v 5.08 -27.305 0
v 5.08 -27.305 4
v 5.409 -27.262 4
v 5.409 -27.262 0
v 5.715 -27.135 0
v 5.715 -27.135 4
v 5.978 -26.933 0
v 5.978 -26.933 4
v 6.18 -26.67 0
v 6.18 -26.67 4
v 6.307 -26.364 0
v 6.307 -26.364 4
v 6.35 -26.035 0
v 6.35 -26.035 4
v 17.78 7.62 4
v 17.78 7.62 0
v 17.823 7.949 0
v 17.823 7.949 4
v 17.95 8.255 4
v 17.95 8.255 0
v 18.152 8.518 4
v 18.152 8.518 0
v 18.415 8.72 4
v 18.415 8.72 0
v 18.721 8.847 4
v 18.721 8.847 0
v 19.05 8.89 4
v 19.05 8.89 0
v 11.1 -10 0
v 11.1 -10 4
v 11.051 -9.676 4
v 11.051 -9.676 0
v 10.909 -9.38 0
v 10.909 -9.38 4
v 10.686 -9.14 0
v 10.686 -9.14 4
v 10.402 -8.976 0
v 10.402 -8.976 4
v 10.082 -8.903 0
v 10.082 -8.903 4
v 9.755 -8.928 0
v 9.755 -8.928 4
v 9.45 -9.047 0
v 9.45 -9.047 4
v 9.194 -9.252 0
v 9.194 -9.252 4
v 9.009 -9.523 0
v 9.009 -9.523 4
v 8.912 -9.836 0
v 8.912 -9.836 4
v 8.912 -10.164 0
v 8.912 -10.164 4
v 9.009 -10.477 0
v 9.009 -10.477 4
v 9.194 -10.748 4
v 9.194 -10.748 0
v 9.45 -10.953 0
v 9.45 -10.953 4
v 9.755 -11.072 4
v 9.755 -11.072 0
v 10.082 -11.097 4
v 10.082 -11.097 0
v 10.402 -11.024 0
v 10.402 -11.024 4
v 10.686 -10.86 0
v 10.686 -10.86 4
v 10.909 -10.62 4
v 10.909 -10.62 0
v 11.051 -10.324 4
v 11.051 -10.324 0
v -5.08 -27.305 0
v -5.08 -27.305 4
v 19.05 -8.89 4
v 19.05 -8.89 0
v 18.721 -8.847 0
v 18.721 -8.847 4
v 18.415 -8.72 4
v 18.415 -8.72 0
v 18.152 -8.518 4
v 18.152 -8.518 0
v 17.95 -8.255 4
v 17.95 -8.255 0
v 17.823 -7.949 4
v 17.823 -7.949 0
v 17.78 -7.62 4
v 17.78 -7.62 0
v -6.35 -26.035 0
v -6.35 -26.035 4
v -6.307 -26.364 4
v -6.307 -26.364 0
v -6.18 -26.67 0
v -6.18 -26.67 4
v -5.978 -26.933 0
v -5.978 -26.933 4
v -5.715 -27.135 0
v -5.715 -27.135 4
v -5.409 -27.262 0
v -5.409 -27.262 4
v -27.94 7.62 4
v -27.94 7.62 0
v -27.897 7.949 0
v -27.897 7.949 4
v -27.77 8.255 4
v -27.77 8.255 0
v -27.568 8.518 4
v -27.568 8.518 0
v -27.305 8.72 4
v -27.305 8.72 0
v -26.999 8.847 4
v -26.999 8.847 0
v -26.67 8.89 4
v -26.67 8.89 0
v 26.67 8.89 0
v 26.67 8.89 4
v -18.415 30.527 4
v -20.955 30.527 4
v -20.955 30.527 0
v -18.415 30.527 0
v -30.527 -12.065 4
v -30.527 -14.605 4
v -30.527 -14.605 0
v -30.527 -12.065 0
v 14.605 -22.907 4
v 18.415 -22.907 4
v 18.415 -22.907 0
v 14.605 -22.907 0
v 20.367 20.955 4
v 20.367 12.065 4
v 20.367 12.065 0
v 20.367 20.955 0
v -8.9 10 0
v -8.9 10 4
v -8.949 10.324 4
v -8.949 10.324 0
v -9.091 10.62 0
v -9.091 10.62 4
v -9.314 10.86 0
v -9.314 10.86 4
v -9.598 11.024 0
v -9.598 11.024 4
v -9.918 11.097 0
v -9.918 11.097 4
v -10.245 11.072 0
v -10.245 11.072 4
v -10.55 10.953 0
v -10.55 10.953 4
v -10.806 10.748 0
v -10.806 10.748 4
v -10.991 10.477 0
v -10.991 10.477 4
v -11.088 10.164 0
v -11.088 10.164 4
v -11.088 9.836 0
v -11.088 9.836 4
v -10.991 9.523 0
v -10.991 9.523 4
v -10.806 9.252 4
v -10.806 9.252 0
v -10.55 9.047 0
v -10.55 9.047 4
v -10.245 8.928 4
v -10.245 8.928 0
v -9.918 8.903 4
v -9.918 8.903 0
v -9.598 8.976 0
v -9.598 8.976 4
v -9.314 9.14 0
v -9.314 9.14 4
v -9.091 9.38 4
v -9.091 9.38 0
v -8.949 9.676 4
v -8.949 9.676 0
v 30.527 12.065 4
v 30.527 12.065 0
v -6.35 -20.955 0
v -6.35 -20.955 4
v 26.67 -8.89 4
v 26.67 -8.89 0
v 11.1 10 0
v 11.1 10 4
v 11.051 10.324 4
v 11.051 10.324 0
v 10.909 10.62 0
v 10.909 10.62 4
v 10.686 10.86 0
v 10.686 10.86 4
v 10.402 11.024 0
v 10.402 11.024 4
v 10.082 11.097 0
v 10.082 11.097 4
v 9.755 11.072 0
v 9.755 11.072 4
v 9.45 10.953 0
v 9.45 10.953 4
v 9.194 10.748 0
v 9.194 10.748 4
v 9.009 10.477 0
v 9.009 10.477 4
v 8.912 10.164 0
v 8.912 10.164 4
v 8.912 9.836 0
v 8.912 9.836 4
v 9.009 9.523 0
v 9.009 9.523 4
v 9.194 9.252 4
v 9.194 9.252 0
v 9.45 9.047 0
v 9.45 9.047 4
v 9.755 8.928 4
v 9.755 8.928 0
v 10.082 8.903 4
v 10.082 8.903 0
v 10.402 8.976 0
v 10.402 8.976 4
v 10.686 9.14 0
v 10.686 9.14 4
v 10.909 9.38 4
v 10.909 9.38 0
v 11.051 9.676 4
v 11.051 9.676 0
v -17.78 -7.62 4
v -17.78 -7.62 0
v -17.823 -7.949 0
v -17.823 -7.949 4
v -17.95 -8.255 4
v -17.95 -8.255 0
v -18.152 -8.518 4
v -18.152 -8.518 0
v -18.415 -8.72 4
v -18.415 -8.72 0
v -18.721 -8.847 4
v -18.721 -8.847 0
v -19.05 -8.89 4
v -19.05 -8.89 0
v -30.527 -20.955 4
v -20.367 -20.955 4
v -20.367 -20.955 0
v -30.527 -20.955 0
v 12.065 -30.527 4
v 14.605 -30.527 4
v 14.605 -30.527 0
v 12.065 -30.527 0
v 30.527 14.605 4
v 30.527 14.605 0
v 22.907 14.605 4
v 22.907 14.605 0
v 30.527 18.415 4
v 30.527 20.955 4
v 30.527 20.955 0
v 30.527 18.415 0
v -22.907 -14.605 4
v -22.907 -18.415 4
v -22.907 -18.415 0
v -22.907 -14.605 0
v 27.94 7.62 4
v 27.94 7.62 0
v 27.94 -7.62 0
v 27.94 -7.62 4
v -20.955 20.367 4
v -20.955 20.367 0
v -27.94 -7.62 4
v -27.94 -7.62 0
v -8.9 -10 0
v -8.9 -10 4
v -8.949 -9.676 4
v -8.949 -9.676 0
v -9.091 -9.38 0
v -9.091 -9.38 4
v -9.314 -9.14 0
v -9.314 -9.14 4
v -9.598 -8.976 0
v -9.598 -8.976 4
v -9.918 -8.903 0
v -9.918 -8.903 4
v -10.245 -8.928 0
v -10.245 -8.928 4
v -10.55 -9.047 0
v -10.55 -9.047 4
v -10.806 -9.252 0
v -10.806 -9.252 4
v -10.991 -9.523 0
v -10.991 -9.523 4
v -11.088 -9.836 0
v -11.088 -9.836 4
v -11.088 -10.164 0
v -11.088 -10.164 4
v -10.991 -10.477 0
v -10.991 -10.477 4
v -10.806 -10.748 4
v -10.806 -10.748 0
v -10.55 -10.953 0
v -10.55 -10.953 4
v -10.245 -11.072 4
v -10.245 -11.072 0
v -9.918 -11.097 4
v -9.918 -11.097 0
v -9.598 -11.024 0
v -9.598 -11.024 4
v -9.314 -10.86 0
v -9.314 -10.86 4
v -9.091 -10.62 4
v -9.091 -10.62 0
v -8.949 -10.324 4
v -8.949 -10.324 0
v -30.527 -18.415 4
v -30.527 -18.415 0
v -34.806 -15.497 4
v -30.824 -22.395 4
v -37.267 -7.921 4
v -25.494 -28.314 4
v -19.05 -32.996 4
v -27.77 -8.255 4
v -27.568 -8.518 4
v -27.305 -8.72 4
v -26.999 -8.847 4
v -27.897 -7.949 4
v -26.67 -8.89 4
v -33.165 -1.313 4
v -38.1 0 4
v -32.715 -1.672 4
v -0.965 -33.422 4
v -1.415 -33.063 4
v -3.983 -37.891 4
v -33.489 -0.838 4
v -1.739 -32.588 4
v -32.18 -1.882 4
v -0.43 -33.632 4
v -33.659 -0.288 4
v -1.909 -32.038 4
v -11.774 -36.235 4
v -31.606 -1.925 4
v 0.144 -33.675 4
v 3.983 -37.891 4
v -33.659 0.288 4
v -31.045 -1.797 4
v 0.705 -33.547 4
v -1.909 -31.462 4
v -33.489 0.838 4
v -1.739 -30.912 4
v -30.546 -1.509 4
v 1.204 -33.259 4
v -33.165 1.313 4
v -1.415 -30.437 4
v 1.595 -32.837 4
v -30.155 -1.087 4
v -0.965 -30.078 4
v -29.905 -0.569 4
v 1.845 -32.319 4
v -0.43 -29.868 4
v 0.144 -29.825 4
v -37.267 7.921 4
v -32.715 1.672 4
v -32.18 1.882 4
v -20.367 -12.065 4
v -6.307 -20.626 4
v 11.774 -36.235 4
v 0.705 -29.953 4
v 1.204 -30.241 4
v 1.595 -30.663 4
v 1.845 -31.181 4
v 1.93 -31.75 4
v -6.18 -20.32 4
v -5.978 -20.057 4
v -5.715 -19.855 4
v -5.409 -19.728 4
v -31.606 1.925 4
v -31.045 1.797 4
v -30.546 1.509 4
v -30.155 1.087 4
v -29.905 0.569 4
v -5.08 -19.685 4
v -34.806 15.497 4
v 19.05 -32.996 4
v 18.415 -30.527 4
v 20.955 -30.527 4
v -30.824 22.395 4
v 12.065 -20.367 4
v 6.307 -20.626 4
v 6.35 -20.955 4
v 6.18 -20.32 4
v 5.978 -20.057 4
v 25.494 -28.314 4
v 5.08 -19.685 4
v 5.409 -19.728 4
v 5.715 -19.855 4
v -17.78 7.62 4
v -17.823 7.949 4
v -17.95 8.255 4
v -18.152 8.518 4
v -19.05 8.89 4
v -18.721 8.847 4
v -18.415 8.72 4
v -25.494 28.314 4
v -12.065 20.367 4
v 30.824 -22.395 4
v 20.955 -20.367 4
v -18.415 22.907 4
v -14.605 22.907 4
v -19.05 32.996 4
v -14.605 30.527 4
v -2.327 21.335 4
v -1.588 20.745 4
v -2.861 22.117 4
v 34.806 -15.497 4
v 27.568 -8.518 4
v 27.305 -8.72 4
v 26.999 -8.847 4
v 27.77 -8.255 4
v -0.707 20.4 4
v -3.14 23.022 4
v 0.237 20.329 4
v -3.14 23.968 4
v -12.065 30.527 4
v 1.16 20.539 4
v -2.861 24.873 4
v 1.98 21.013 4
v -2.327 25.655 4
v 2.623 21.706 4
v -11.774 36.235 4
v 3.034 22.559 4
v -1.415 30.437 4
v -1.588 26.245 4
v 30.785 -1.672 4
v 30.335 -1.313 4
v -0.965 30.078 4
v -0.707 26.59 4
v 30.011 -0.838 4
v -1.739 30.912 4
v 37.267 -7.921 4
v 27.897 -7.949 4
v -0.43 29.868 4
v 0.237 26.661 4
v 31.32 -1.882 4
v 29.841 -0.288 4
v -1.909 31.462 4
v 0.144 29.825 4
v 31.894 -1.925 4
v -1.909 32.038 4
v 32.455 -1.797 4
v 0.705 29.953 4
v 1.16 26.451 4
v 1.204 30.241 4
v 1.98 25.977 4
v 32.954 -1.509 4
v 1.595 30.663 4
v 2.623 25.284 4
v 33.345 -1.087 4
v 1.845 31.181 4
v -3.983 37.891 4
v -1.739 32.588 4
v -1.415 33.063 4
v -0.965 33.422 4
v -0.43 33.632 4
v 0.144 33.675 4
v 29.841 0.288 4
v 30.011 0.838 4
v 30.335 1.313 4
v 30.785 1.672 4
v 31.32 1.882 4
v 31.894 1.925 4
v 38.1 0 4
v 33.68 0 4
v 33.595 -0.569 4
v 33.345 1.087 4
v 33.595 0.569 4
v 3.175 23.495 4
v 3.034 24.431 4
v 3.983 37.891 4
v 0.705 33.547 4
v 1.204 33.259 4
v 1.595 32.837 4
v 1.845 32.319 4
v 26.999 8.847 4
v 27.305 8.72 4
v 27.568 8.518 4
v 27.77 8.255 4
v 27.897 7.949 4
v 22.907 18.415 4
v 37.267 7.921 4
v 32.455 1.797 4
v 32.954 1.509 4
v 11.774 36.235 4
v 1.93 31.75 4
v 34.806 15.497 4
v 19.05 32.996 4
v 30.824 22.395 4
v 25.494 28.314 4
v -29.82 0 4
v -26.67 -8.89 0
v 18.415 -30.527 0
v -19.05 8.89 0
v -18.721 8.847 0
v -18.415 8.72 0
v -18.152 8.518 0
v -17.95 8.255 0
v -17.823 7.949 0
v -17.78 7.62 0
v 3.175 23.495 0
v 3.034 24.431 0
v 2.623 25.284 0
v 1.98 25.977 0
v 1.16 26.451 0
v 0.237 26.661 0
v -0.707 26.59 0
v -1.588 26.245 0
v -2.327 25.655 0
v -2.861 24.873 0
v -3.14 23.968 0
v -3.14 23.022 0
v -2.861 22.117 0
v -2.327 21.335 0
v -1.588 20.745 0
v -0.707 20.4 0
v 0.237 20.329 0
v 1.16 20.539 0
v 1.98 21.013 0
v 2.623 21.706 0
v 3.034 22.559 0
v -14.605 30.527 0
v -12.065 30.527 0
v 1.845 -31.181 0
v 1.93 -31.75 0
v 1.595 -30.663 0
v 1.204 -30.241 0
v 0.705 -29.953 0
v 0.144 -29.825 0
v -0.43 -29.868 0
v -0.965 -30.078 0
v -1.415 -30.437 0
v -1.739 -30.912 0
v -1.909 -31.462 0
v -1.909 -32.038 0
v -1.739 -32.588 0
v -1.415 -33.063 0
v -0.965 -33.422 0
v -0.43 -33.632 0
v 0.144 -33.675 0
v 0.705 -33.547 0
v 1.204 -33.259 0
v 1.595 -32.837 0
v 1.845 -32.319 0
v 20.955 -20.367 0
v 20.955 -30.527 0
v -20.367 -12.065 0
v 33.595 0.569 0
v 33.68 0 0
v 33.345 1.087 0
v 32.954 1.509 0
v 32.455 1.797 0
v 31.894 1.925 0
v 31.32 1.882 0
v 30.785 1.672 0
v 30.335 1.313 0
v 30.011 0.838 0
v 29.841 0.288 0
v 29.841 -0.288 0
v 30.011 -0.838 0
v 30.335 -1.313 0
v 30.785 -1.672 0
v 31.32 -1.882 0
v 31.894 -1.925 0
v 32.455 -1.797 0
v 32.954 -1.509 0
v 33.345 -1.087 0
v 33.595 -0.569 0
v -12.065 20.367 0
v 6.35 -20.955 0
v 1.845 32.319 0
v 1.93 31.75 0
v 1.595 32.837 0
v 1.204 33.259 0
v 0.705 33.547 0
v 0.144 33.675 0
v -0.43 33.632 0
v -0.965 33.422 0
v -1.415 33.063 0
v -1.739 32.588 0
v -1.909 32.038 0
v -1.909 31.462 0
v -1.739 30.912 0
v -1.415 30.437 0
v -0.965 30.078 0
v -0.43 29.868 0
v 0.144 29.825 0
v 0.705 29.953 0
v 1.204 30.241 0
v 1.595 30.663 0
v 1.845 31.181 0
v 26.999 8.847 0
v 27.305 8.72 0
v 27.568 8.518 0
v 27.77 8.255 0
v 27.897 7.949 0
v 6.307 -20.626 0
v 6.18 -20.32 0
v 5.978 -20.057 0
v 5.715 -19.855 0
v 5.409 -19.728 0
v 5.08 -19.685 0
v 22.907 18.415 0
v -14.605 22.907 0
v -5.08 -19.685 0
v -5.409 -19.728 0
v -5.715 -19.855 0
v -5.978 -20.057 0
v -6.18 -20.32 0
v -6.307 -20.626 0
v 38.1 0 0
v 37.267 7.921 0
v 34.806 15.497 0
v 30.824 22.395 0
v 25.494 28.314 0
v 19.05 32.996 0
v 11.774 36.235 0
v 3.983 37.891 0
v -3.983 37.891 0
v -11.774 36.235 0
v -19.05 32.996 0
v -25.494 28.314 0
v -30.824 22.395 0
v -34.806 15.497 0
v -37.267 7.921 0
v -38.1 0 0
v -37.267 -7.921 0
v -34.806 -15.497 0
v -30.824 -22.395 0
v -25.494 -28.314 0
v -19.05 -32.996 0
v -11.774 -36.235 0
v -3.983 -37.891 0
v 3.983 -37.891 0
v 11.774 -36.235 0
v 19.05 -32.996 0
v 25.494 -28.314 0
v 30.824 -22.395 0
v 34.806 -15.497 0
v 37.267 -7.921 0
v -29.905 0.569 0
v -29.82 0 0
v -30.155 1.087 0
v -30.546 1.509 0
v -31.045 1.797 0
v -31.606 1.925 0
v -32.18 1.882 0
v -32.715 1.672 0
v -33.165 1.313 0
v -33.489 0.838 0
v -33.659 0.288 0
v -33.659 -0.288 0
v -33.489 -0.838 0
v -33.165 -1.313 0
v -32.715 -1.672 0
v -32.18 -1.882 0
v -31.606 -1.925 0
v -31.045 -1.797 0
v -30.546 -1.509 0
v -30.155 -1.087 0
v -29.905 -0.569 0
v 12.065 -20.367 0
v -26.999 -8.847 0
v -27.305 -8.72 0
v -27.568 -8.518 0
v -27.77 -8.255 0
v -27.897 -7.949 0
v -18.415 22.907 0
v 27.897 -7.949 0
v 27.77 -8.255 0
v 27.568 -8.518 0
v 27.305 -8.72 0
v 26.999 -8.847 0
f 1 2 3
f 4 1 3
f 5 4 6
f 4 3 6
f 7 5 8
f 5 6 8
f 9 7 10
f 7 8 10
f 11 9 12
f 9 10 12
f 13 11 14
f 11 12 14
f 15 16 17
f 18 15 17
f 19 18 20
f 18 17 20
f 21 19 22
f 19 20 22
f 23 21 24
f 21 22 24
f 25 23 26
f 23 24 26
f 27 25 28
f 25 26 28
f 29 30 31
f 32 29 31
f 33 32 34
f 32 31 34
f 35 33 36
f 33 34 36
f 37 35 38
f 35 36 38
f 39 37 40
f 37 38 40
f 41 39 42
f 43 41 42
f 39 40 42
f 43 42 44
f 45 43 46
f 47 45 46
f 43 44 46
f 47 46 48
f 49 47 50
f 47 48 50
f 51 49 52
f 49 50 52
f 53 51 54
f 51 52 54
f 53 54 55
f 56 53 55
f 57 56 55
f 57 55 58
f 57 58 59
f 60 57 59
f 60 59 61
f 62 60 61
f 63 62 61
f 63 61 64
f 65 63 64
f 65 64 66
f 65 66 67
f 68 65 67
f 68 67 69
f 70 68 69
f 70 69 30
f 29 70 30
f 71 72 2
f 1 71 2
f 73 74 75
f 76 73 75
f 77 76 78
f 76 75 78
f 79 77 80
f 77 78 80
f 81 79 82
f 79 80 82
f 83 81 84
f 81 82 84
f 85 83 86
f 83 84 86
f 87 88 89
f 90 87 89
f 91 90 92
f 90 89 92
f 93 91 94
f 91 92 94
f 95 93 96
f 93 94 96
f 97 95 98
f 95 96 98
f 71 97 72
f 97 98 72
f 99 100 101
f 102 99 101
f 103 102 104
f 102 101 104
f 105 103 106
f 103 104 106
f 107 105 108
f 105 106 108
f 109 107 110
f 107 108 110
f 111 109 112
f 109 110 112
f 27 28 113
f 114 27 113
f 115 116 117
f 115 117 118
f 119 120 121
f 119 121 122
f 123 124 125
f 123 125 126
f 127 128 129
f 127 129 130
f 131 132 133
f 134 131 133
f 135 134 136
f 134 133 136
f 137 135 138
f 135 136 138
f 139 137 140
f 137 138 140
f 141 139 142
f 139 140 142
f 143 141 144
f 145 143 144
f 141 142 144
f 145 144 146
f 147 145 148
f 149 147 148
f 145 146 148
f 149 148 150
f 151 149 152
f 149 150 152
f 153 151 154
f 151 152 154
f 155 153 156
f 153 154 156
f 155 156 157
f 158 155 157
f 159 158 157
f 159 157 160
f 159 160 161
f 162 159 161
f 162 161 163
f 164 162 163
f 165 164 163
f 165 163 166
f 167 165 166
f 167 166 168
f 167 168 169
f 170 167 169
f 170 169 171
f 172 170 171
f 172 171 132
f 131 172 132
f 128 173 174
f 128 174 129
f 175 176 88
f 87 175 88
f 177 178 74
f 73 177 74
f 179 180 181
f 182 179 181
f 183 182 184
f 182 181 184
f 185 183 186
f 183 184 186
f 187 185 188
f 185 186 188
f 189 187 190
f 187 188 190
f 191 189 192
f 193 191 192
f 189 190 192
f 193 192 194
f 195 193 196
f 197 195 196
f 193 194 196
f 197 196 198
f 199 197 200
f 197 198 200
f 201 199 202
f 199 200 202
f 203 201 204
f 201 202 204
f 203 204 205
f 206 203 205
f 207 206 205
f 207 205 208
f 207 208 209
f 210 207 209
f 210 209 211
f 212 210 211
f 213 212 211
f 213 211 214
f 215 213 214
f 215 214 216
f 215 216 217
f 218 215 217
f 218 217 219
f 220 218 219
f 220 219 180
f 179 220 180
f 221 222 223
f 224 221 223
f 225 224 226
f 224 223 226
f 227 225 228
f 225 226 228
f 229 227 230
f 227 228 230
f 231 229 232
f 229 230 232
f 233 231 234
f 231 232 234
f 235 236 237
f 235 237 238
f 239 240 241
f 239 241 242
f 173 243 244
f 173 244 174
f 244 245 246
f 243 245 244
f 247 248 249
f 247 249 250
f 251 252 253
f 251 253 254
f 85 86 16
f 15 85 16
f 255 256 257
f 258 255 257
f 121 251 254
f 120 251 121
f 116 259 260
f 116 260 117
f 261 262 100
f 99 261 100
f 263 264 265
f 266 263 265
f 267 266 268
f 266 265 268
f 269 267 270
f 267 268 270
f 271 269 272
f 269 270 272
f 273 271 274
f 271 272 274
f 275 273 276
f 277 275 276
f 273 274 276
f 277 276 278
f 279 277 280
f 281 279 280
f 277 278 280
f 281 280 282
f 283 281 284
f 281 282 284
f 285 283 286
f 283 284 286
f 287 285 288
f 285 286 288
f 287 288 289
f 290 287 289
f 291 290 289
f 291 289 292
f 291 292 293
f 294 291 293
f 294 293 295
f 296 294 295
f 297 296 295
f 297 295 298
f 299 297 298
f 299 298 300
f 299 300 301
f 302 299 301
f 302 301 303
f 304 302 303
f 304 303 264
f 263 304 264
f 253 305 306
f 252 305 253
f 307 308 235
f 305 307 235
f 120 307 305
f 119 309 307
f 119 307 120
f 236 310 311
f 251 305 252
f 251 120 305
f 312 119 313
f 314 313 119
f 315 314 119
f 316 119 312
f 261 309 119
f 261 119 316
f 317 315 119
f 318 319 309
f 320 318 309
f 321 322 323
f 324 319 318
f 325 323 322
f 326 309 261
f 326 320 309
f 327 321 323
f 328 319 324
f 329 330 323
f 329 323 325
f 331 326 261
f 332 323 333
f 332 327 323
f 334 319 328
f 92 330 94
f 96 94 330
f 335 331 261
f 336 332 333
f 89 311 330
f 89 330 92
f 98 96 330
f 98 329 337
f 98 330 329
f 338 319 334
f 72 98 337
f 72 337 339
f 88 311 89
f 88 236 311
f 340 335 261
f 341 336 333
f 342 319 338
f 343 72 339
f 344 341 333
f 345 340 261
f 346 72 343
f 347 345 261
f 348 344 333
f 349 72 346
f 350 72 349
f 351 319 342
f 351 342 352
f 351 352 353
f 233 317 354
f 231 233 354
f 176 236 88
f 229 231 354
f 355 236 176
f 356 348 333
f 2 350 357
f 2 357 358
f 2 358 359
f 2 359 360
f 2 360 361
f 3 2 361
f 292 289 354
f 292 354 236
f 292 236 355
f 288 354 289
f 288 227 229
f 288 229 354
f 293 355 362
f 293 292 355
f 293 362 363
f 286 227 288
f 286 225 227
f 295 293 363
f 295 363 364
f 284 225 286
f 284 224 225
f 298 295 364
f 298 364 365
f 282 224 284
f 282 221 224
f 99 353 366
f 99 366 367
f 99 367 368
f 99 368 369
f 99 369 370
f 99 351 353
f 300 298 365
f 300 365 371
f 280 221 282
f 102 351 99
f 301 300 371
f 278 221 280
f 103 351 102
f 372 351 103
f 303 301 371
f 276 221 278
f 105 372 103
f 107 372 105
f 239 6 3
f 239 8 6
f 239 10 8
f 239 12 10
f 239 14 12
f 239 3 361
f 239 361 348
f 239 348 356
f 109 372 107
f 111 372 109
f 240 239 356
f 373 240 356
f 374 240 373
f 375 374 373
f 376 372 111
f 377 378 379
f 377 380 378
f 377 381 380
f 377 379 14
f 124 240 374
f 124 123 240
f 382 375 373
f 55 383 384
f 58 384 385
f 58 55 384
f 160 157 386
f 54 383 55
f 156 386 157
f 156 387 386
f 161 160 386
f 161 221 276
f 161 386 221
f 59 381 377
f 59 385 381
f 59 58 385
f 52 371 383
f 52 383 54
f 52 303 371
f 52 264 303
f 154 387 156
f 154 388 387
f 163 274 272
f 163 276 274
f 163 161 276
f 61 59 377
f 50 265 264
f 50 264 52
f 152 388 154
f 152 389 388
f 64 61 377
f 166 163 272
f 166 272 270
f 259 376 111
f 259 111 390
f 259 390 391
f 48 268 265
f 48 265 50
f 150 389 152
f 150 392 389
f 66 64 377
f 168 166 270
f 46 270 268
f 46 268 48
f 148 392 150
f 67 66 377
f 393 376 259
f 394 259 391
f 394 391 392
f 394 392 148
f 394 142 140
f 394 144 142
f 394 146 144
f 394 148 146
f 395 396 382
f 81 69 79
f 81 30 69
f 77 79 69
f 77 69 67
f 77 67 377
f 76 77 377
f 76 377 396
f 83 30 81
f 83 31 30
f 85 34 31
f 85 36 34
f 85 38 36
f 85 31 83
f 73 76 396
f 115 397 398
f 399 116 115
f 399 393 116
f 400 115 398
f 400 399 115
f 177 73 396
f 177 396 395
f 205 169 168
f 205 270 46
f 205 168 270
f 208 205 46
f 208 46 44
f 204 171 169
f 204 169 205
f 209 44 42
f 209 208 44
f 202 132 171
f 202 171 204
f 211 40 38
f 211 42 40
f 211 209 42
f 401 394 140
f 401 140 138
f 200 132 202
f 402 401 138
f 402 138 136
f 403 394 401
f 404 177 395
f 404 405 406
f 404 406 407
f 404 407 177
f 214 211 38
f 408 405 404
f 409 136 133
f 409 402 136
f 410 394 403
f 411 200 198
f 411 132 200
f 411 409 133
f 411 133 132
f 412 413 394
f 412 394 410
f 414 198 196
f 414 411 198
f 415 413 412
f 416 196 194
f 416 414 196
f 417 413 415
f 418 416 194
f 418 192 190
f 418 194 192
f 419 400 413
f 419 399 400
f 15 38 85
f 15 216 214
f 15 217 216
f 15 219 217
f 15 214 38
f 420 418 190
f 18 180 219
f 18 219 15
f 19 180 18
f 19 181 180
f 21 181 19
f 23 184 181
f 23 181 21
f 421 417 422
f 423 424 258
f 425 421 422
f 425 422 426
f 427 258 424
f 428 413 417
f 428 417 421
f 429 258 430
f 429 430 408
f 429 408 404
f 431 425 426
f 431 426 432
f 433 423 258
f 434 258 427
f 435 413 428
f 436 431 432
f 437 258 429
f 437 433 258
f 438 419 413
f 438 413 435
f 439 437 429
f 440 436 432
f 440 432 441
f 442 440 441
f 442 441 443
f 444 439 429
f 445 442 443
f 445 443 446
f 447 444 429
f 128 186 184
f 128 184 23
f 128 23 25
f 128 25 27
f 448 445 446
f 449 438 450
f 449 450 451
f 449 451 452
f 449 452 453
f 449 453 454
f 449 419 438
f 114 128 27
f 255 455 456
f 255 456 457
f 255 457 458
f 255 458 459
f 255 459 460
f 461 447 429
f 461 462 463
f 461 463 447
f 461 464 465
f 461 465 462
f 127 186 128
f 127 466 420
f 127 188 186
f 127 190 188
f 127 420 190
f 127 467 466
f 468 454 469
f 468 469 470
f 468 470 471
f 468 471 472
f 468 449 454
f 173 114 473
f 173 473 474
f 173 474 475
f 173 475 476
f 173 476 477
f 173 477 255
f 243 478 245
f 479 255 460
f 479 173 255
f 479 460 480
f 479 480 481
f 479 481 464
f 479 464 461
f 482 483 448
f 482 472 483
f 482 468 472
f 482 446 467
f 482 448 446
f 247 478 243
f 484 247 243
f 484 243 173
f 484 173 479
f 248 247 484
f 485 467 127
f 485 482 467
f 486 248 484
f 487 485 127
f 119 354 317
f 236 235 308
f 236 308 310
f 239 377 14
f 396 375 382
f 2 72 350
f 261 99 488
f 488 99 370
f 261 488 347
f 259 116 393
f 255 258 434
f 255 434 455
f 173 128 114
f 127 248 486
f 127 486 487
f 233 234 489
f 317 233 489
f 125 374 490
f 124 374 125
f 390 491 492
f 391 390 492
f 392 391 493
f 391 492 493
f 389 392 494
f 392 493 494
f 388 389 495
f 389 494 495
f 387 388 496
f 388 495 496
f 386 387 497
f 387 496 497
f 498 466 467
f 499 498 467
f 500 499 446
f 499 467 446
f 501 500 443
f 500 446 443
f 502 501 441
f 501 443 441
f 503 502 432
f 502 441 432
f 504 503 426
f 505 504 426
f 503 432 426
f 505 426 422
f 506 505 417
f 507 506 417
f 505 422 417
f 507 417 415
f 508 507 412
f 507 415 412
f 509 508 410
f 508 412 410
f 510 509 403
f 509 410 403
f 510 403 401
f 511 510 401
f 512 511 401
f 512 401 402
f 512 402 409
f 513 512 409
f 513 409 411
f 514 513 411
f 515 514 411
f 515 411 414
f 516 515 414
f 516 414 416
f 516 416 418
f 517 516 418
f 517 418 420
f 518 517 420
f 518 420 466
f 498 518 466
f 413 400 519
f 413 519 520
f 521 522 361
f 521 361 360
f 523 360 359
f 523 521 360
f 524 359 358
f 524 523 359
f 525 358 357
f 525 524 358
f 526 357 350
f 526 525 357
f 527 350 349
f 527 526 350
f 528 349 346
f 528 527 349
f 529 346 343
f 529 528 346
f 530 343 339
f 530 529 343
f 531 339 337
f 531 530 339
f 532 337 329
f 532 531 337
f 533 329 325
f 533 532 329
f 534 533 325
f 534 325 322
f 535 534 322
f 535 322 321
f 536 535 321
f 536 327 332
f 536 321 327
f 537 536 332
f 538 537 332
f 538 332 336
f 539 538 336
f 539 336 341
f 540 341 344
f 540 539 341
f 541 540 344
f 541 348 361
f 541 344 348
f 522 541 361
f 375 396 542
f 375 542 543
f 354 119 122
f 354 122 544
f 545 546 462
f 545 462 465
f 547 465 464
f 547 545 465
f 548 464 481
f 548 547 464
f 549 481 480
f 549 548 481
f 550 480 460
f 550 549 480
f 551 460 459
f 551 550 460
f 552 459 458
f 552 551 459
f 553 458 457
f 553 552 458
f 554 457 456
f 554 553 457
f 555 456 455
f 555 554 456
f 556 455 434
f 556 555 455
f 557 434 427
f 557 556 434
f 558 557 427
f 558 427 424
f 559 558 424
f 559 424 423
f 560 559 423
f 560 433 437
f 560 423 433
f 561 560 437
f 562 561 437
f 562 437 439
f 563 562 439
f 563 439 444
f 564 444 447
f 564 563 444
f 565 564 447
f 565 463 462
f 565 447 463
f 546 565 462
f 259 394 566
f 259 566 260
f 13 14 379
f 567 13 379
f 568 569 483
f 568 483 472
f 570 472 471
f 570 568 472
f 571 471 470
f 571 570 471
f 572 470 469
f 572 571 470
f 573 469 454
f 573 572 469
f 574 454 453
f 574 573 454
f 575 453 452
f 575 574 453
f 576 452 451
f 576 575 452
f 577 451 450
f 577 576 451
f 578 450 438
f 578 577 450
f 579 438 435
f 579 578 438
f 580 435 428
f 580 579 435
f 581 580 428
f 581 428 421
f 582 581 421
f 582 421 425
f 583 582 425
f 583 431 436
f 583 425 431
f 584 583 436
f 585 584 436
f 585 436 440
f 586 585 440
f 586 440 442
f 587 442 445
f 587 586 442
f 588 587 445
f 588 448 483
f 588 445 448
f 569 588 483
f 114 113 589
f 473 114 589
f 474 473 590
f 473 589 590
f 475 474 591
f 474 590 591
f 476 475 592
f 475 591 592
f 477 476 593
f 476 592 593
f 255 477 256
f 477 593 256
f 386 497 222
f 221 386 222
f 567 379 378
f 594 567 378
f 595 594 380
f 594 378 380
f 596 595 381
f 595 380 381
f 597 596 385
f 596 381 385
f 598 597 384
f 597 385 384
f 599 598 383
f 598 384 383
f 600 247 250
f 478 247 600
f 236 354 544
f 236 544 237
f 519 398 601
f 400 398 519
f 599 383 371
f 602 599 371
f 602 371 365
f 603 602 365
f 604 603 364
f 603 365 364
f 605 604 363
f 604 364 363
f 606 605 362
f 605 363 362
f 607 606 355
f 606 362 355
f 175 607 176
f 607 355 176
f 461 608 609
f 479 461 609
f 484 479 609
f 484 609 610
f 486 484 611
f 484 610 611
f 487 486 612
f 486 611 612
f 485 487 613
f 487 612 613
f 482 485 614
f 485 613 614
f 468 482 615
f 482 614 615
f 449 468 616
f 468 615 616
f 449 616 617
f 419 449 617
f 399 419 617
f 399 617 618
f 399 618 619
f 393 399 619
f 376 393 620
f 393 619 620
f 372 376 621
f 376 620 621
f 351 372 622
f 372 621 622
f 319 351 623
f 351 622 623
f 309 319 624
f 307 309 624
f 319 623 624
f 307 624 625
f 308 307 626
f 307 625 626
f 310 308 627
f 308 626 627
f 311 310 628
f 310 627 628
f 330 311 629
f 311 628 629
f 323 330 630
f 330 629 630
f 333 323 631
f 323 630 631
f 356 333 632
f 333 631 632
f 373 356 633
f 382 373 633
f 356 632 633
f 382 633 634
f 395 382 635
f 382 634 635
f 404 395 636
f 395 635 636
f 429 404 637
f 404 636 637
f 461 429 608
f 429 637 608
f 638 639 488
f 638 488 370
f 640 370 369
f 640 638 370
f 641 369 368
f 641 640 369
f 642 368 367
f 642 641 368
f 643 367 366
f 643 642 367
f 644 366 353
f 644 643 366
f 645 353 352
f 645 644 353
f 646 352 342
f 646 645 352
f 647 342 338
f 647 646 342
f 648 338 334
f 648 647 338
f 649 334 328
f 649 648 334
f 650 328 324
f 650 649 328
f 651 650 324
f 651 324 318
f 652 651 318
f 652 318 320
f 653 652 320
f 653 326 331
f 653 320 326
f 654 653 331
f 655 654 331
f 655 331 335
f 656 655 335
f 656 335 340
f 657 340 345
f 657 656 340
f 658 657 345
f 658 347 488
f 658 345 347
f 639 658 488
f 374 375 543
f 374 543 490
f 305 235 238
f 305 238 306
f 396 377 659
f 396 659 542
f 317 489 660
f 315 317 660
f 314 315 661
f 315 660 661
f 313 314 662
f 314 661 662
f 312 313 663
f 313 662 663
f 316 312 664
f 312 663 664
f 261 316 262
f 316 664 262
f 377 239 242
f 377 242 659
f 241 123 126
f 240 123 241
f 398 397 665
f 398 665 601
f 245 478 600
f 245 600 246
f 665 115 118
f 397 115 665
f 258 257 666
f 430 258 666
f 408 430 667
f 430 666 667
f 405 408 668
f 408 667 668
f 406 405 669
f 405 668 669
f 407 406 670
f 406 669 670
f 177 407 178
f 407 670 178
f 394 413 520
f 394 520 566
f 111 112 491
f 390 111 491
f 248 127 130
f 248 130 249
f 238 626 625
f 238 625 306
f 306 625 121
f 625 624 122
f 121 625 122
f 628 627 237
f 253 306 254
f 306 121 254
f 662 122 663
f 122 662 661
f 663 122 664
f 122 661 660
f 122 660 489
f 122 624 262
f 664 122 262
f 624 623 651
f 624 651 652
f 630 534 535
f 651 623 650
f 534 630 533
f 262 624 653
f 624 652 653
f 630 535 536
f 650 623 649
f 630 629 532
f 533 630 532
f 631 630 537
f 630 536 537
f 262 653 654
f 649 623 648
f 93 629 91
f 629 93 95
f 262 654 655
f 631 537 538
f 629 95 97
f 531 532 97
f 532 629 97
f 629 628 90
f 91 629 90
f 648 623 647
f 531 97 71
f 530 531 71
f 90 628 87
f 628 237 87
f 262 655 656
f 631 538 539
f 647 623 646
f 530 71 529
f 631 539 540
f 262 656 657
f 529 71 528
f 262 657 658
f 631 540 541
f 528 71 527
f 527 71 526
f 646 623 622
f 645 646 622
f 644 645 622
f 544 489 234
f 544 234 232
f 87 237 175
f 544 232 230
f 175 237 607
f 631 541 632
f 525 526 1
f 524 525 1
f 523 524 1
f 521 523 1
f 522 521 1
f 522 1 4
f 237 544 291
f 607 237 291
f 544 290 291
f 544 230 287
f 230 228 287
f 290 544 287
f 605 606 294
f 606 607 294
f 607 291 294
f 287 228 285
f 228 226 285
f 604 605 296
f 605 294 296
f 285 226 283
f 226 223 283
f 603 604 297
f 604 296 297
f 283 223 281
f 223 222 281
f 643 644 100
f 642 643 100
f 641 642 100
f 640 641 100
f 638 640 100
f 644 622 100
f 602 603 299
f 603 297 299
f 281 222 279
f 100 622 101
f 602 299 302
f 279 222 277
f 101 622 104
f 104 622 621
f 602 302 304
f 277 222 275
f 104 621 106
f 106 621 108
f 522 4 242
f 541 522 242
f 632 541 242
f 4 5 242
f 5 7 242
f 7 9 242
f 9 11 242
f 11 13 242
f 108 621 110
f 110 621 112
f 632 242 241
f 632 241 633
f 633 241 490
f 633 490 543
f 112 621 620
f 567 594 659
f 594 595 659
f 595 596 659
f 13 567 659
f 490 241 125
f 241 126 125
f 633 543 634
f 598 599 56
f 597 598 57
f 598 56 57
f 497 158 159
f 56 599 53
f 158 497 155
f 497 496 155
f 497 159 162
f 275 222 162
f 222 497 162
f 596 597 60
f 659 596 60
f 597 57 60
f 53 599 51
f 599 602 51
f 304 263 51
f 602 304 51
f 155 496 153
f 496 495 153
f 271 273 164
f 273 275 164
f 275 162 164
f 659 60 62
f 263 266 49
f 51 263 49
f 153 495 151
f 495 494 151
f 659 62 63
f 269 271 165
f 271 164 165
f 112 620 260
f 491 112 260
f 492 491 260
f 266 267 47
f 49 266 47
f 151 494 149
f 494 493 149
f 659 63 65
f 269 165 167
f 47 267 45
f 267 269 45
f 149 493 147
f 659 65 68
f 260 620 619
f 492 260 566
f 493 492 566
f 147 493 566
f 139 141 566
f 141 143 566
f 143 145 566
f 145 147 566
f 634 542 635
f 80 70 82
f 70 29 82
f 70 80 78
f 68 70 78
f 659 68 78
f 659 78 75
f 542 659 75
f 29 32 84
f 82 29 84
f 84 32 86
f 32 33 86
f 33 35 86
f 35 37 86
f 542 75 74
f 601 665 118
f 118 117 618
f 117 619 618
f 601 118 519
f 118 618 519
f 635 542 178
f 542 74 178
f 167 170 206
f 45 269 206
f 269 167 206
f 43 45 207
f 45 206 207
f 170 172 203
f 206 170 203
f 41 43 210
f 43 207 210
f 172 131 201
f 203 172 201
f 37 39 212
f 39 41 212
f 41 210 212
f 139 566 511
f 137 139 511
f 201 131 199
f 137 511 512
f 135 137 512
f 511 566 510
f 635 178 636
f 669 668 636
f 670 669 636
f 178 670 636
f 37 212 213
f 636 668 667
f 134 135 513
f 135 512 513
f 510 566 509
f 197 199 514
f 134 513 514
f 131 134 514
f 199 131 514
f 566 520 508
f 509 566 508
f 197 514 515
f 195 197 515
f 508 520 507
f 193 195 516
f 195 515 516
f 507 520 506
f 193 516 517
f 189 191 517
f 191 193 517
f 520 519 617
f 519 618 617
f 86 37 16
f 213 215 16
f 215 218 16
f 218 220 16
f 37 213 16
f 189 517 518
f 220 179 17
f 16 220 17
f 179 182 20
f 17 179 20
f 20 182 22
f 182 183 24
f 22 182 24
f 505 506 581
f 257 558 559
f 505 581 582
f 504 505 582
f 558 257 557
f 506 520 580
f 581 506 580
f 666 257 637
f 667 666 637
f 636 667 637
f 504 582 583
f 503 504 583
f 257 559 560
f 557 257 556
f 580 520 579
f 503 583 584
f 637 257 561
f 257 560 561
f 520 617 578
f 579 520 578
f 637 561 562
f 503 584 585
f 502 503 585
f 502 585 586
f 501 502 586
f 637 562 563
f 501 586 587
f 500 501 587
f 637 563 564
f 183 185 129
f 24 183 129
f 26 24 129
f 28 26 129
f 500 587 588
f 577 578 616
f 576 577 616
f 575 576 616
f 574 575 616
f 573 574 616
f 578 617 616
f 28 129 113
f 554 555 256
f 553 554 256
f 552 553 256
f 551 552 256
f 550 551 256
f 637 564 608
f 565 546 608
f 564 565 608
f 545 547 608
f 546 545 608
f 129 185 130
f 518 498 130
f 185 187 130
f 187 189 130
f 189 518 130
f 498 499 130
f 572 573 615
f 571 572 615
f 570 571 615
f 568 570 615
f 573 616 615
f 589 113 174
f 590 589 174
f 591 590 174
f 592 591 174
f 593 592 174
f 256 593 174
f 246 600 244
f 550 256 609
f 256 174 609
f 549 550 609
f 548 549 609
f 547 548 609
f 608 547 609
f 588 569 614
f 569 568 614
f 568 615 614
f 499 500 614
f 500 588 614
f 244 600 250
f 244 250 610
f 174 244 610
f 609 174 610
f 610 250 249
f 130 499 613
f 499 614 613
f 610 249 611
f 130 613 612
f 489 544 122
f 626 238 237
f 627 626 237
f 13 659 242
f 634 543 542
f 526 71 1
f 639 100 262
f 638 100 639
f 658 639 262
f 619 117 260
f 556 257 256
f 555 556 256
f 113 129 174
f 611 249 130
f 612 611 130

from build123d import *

# Parameters (mm, degrees)
SKETCH1_R               = 38.1
BOSS_EXTRUDE1_DEPTH     = 4
SKETCH2_R               = 1.1
CUT_EXTRUDE1_DEPTH      = 55.029806589
CUT_EXTRUDE2_DEPTH      = 55.029806589
CUT_EXTRUDE2_DEPTH_BACK = 55.029806589
SKETCH3_R               = 1.9304
CUT_EXTRUDE3_DEPTH      = 55.029806589
CUT_EXTRUDE3_DEPTH_BACK = 55.029806589
CUT_EXTRUDE4_REACH      = 56.03
SKETCH5_R               = 3.175
CUT_EXTRUDE5_REACH      = 56.03


with BuildPart() as part:
    # Sketch1 → Boss-Extrude1 (new body)
    with BuildSketch(Plane.XY):
        Circle(SKETCH1_R)
    extrude(amount=BOSS_EXTRUDE1_DEPTH)

    # Sketch2 → Cut-Extrude1 (cut, through all)
    with BuildSketch(Plane.XY.offset(4)):
        with Locations((10, 10)):
            Circle(SKETCH2_R)
        with Locations((10, -10)):
            Circle(SKETCH2_R)
        with Locations((-10, -10)):
            Circle(SKETCH2_R)
        with Locations((-10, 10)):
            Circle(SKETCH2_R)
    extrude(amount=-CUT_EXTRUDE1_DEPTH, mode=Mode.SUBTRACT)

    # Sketch3 → Cut-Extrude2 (cut, two sides: drawn at the far end of the back side and taken through both)
    with BuildSketch(Plane.XY.offset(4).offset(-CUT_EXTRUDE2_DEPTH_BACK)):
        with Locations((0, -31.75)):
            Circle(SKETCH3_R)
        with Locations((-31.75, 0)):
            Circle(SKETCH3_R)
        with Locations((0, 31.75)):
            Circle(SKETCH3_R)
        with Locations((31.75, 0)):
            Circle(SKETCH3_R)
    extrude(amount=CUT_EXTRUDE2_DEPTH + CUT_EXTRUDE2_DEPTH_BACK, mode=Mode.SUBTRACT)

    # Sketch4 → Cut-Extrude3 (cut, two sides: drawn at the far end of the back side and taken through both)
    with BuildSketch(Plane.XY.offset(4).offset(-CUT_EXTRUDE3_DEPTH_BACK)):
        with BuildLine():
            Line((-19.05, -8.89), (-26.67, -8.89))
            ThreePointArc((-26.67, -8.89), (-27.568025612, -8.518025612), (-27.94, -7.62))
            Line((-27.94, -7.62), (-27.94, 7.62))
            ThreePointArc((-27.94, 7.62), (-27.568025612, 8.518025612), (-26.67, 8.89))
            Line((-26.67, 8.89), (-19.05, 8.89))
            ThreePointArc((-19.05, 8.89), (-18.151974388, 8.518025612), (-17.78, 7.62))
            Line((-17.78, 7.62), (-17.78, -7.62))
            ThreePointArc((-17.78, -7.62), (-18.151974388, -8.518025612), (-19.05, -8.89))
        make_face()
        with BuildLine():
            Line((19.05, 8.89), (26.67, 8.89))
            ThreePointArc((26.67, 8.89), (27.568025612, 8.518025612), (27.94, 7.62))
            Line((27.94, 7.62), (27.94, -7.62))
            ThreePointArc((27.94, -7.62), (27.568025612, -8.518025612), (26.67, -8.89))
            Line((26.67, -8.89), (19.05, -8.89))
            ThreePointArc((19.05, -8.89), (18.151974388, -8.518025612), (17.78, -7.62))
            Line((17.78, -7.62), (17.78, 7.62))
            ThreePointArc((17.78, 7.62), (18.151974388, 8.518025612), (19.05, 8.89))
        make_face()
    extrude(amount=CUT_EXTRUDE3_DEPTH + CUT_EXTRUDE3_DEPTH_BACK, mode=Mode.SUBTRACT)

    # Sketch5 → Cut-Extrude4 (cut, up to next)
    with BuildSketch(Plane.XY.offset(4), mode=Mode.PRIVATE) as cut_extrude4_sk1:
        with Locations((0, 23.495)):
            Circle(SKETCH5_R)
    cut_extrude4_tool1 = extrude(cut_extrude4_sk1.sketch, amount=-CUT_EXTRUDE4_REACH, mode=Mode.PRIVATE) & part.part
    # Sketch5 → Cut-Extrude4 (cut, up to next)
    with BuildSketch(Plane.XY.offset(4), mode=Mode.PRIVATE) as cut_extrude4_sk2:
        with BuildLine():
            Line((-5.08, -27.305), (5.08, -27.305))
            ThreePointArc((5.08, -27.305), (5.978025612, -26.933025612), (6.35, -26.035))
            Line((6.35, -26.035), (6.35, -20.955))
            ThreePointArc((6.35, -20.955), (5.978025612, -20.056974388), (5.08, -19.685))
            Line((5.08, -19.685), (-5.08, -19.685))
            ThreePointArc((-5.08, -19.685), (-5.978025612, -20.056974388), (-6.35, -20.955))
            Line((-6.35, -20.955), (-6.35, -26.035))
            ThreePointArc((-6.35, -26.035), (-5.978025612, -26.933025612), (-5.08, -27.305))
        make_face()
    cut_extrude4_tool2 = extrude(cut_extrude4_sk2.sketch, amount=-CUT_EXTRUDE4_REACH, mode=Mode.PRIVATE) & part.part
    add(cut_extrude4_tool1.solids().sort_by_distance((0, 23.495, 4))[0], mode=Mode.SUBTRACT)
    add(cut_extrude4_tool2.solids().sort_by_distance((0, -23.495, 4))[0], mode=Mode.SUBTRACT)

    # Sketch6 → Cut-Extrude5 (cut, up to next)
    with BuildSketch(Plane.XY.offset(4), mode=Mode.PRIVATE) as cut_extrude5_sk1:
        Polygon((-18.415, 22.90700482), (-14.605, 22.90700482), (-14.605, 30.52700482), (-12.065, 30.52700482), (-12.065, 20.36700482), (-20.955, 20.36700482), (-20.955, 30.52700482), (-18.415, 30.52700482), align=None)
    cut_extrude5_tool1 = extrude(cut_extrude5_sk1.sketch, amount=-CUT_EXTRUDE5_REACH, mode=Mode.PRIVATE) & part.part
    # Sketch6 → Cut-Extrude5 (cut, up to next)
    with BuildSketch(Plane.XY.offset(4), mode=Mode.PRIVATE) as cut_extrude5_sk2:
        Polygon((22.90700482, 18.415), (22.90700482, 14.605), (30.52700482, 14.605), (30.52700482, 12.065), (20.36700482, 12.065), (20.36700482, 20.955), (30.52700482, 20.955), (30.52700482, 18.415), align=None)
    cut_extrude5_tool2 = extrude(cut_extrude5_sk2.sketch, amount=-CUT_EXTRUDE5_REACH, mode=Mode.PRIVATE) & part.part
    # Sketch6 → Cut-Extrude5 (cut, up to next)
    with BuildSketch(Plane.XY.offset(4), mode=Mode.PRIVATE) as cut_extrude5_sk3:
        Polygon((18.415, -22.90700482), (14.605, -22.90700482), (14.605, -30.52700482), (12.065, -30.52700482), (12.065, -20.36700482), (20.955, -20.36700482), (20.955, -30.52700482), (18.415, -30.52700482), align=None)
    cut_extrude5_tool3 = extrude(cut_extrude5_sk3.sketch, amount=-CUT_EXTRUDE5_REACH, mode=Mode.PRIVATE) & part.part
    # Sketch6 → Cut-Extrude5 (cut, up to next)
    with BuildSketch(Plane.XY.offset(4), mode=Mode.PRIVATE) as cut_extrude5_sk4:
        Polygon((-22.90700482, -18.415), (-22.90700482, -14.605), (-30.52700482, -14.605), (-30.52700482, -12.065), (-20.36700482, -12.065), (-20.36700482, -20.955), (-30.52700482, -20.955), (-30.52700482, -18.415), align=None)
    cut_extrude5_tool4 = extrude(cut_extrude5_sk4.sketch, amount=-CUT_EXTRUDE5_REACH, mode=Mode.PRIVATE) & part.part
    add(cut_extrude5_tool1.solids().sort_by_distance((-16.51, 22.772002, 4))[0], mode=Mode.SUBTRACT)
    add(cut_extrude5_tool2.solids().sort_by_distance((22.772002, 16.51, 4))[0], mode=Mode.SUBTRACT)
    add(cut_extrude5_tool3.solids().sort_by_distance((16.51, -22.772002, 4))[0], mode=Mode.SUBTRACT)
    add(cut_extrude5_tool4.solids().sort_by_distance((-22.772002, -16.51, 4))[0], mode=Mode.SUBTRACT)


solid = part.part
